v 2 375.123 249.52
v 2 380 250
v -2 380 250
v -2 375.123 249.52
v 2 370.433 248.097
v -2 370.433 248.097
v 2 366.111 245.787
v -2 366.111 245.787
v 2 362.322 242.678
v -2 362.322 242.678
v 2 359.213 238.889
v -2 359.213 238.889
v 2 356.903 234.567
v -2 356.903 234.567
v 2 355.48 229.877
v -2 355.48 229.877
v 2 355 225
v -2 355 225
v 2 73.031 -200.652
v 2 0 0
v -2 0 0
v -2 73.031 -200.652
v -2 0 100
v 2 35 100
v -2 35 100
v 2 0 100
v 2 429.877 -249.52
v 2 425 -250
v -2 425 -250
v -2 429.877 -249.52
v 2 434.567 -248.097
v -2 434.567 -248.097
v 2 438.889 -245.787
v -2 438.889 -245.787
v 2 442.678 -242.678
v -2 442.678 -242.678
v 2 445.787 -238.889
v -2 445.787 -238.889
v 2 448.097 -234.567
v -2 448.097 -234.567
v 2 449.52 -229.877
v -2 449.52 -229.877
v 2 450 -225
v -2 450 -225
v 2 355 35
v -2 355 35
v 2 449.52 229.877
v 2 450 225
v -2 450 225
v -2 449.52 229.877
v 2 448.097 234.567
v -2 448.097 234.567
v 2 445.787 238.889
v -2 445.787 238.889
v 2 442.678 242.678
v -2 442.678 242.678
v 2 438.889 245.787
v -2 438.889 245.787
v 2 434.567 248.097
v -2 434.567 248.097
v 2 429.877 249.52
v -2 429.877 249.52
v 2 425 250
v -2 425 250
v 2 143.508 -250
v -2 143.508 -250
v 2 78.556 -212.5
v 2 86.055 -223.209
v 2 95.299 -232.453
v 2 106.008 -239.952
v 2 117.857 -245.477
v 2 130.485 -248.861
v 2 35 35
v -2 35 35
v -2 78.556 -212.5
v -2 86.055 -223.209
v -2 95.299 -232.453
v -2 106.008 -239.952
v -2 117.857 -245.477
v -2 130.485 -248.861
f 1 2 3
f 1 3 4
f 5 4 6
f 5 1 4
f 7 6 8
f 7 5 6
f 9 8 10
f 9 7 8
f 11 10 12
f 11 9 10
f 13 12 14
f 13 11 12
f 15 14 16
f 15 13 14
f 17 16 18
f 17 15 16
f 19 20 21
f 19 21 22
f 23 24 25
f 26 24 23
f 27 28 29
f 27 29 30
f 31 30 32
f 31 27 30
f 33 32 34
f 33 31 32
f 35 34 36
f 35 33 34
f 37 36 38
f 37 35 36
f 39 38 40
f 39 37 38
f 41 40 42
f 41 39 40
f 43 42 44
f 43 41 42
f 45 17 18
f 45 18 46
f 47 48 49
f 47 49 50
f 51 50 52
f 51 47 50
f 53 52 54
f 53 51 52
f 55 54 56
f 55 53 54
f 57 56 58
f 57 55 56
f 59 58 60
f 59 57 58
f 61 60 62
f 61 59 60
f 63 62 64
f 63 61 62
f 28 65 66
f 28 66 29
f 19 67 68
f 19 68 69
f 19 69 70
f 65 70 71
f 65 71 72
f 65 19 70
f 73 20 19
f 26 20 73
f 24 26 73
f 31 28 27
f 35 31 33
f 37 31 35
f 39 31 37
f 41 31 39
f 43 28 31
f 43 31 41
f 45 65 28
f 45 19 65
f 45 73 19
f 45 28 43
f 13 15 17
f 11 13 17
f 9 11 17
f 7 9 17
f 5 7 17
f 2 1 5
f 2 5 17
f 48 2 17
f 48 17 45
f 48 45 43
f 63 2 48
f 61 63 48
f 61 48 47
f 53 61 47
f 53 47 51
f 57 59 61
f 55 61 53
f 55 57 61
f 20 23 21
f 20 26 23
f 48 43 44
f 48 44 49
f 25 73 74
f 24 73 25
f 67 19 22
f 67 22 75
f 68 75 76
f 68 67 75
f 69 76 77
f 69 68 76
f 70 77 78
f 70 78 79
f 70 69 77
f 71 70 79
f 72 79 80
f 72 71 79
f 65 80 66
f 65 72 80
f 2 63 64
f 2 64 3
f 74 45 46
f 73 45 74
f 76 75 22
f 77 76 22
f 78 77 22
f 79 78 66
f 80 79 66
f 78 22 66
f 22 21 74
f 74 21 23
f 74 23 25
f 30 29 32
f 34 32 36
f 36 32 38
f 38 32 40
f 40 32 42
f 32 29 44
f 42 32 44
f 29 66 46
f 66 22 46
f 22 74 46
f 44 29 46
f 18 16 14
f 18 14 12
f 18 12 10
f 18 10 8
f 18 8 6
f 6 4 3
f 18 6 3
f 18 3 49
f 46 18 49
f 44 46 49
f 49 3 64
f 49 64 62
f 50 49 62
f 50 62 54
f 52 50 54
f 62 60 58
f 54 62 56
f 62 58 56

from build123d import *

# Parameters (mm, degrees)
F1_DEPTH      = 2
F1_DEPTH_BACK = 2


with BuildPart() as f1:
    # F0 (on Right) → F1 (new body, two sides)
    with BuildSketch(Plane.YZ) as f1_sk:
        with BuildLine():
            Line((0, 100), (0, 0))
            Line((0, 0), (73.031177, -200.651511))
            ThreePointArc((73.031177, -200.651511), (100.489891, -236.436403), (143.508124, -250))
            Line((143.508124, -250), (425, -250))
            ThreePointArc((425, -250), (442.67767, -242.67767), (450, -225))
            Line((450, -225), (450, 0))
            Line((450, 0), (450, 225))
            ThreePointArc((450, 225), (442.67767, 242.67767), (425, 250))
            Line((425, 250), (380, 250))
            ThreePointArc((380, 250), (362.32233, 242.67767), (355, 225))
            Line((355, 225), (355, 35))
            Line((355, 35), (35, 35))
            Line((35, 35), (35, 100))
            Line((35, 100), (0, 100))
        make_face()
    extrude(amount=F1_DEPTH)
    extrude(f1_sk.sketch, amount=-F1_DEPTH_BACK)


solid = f1.part
